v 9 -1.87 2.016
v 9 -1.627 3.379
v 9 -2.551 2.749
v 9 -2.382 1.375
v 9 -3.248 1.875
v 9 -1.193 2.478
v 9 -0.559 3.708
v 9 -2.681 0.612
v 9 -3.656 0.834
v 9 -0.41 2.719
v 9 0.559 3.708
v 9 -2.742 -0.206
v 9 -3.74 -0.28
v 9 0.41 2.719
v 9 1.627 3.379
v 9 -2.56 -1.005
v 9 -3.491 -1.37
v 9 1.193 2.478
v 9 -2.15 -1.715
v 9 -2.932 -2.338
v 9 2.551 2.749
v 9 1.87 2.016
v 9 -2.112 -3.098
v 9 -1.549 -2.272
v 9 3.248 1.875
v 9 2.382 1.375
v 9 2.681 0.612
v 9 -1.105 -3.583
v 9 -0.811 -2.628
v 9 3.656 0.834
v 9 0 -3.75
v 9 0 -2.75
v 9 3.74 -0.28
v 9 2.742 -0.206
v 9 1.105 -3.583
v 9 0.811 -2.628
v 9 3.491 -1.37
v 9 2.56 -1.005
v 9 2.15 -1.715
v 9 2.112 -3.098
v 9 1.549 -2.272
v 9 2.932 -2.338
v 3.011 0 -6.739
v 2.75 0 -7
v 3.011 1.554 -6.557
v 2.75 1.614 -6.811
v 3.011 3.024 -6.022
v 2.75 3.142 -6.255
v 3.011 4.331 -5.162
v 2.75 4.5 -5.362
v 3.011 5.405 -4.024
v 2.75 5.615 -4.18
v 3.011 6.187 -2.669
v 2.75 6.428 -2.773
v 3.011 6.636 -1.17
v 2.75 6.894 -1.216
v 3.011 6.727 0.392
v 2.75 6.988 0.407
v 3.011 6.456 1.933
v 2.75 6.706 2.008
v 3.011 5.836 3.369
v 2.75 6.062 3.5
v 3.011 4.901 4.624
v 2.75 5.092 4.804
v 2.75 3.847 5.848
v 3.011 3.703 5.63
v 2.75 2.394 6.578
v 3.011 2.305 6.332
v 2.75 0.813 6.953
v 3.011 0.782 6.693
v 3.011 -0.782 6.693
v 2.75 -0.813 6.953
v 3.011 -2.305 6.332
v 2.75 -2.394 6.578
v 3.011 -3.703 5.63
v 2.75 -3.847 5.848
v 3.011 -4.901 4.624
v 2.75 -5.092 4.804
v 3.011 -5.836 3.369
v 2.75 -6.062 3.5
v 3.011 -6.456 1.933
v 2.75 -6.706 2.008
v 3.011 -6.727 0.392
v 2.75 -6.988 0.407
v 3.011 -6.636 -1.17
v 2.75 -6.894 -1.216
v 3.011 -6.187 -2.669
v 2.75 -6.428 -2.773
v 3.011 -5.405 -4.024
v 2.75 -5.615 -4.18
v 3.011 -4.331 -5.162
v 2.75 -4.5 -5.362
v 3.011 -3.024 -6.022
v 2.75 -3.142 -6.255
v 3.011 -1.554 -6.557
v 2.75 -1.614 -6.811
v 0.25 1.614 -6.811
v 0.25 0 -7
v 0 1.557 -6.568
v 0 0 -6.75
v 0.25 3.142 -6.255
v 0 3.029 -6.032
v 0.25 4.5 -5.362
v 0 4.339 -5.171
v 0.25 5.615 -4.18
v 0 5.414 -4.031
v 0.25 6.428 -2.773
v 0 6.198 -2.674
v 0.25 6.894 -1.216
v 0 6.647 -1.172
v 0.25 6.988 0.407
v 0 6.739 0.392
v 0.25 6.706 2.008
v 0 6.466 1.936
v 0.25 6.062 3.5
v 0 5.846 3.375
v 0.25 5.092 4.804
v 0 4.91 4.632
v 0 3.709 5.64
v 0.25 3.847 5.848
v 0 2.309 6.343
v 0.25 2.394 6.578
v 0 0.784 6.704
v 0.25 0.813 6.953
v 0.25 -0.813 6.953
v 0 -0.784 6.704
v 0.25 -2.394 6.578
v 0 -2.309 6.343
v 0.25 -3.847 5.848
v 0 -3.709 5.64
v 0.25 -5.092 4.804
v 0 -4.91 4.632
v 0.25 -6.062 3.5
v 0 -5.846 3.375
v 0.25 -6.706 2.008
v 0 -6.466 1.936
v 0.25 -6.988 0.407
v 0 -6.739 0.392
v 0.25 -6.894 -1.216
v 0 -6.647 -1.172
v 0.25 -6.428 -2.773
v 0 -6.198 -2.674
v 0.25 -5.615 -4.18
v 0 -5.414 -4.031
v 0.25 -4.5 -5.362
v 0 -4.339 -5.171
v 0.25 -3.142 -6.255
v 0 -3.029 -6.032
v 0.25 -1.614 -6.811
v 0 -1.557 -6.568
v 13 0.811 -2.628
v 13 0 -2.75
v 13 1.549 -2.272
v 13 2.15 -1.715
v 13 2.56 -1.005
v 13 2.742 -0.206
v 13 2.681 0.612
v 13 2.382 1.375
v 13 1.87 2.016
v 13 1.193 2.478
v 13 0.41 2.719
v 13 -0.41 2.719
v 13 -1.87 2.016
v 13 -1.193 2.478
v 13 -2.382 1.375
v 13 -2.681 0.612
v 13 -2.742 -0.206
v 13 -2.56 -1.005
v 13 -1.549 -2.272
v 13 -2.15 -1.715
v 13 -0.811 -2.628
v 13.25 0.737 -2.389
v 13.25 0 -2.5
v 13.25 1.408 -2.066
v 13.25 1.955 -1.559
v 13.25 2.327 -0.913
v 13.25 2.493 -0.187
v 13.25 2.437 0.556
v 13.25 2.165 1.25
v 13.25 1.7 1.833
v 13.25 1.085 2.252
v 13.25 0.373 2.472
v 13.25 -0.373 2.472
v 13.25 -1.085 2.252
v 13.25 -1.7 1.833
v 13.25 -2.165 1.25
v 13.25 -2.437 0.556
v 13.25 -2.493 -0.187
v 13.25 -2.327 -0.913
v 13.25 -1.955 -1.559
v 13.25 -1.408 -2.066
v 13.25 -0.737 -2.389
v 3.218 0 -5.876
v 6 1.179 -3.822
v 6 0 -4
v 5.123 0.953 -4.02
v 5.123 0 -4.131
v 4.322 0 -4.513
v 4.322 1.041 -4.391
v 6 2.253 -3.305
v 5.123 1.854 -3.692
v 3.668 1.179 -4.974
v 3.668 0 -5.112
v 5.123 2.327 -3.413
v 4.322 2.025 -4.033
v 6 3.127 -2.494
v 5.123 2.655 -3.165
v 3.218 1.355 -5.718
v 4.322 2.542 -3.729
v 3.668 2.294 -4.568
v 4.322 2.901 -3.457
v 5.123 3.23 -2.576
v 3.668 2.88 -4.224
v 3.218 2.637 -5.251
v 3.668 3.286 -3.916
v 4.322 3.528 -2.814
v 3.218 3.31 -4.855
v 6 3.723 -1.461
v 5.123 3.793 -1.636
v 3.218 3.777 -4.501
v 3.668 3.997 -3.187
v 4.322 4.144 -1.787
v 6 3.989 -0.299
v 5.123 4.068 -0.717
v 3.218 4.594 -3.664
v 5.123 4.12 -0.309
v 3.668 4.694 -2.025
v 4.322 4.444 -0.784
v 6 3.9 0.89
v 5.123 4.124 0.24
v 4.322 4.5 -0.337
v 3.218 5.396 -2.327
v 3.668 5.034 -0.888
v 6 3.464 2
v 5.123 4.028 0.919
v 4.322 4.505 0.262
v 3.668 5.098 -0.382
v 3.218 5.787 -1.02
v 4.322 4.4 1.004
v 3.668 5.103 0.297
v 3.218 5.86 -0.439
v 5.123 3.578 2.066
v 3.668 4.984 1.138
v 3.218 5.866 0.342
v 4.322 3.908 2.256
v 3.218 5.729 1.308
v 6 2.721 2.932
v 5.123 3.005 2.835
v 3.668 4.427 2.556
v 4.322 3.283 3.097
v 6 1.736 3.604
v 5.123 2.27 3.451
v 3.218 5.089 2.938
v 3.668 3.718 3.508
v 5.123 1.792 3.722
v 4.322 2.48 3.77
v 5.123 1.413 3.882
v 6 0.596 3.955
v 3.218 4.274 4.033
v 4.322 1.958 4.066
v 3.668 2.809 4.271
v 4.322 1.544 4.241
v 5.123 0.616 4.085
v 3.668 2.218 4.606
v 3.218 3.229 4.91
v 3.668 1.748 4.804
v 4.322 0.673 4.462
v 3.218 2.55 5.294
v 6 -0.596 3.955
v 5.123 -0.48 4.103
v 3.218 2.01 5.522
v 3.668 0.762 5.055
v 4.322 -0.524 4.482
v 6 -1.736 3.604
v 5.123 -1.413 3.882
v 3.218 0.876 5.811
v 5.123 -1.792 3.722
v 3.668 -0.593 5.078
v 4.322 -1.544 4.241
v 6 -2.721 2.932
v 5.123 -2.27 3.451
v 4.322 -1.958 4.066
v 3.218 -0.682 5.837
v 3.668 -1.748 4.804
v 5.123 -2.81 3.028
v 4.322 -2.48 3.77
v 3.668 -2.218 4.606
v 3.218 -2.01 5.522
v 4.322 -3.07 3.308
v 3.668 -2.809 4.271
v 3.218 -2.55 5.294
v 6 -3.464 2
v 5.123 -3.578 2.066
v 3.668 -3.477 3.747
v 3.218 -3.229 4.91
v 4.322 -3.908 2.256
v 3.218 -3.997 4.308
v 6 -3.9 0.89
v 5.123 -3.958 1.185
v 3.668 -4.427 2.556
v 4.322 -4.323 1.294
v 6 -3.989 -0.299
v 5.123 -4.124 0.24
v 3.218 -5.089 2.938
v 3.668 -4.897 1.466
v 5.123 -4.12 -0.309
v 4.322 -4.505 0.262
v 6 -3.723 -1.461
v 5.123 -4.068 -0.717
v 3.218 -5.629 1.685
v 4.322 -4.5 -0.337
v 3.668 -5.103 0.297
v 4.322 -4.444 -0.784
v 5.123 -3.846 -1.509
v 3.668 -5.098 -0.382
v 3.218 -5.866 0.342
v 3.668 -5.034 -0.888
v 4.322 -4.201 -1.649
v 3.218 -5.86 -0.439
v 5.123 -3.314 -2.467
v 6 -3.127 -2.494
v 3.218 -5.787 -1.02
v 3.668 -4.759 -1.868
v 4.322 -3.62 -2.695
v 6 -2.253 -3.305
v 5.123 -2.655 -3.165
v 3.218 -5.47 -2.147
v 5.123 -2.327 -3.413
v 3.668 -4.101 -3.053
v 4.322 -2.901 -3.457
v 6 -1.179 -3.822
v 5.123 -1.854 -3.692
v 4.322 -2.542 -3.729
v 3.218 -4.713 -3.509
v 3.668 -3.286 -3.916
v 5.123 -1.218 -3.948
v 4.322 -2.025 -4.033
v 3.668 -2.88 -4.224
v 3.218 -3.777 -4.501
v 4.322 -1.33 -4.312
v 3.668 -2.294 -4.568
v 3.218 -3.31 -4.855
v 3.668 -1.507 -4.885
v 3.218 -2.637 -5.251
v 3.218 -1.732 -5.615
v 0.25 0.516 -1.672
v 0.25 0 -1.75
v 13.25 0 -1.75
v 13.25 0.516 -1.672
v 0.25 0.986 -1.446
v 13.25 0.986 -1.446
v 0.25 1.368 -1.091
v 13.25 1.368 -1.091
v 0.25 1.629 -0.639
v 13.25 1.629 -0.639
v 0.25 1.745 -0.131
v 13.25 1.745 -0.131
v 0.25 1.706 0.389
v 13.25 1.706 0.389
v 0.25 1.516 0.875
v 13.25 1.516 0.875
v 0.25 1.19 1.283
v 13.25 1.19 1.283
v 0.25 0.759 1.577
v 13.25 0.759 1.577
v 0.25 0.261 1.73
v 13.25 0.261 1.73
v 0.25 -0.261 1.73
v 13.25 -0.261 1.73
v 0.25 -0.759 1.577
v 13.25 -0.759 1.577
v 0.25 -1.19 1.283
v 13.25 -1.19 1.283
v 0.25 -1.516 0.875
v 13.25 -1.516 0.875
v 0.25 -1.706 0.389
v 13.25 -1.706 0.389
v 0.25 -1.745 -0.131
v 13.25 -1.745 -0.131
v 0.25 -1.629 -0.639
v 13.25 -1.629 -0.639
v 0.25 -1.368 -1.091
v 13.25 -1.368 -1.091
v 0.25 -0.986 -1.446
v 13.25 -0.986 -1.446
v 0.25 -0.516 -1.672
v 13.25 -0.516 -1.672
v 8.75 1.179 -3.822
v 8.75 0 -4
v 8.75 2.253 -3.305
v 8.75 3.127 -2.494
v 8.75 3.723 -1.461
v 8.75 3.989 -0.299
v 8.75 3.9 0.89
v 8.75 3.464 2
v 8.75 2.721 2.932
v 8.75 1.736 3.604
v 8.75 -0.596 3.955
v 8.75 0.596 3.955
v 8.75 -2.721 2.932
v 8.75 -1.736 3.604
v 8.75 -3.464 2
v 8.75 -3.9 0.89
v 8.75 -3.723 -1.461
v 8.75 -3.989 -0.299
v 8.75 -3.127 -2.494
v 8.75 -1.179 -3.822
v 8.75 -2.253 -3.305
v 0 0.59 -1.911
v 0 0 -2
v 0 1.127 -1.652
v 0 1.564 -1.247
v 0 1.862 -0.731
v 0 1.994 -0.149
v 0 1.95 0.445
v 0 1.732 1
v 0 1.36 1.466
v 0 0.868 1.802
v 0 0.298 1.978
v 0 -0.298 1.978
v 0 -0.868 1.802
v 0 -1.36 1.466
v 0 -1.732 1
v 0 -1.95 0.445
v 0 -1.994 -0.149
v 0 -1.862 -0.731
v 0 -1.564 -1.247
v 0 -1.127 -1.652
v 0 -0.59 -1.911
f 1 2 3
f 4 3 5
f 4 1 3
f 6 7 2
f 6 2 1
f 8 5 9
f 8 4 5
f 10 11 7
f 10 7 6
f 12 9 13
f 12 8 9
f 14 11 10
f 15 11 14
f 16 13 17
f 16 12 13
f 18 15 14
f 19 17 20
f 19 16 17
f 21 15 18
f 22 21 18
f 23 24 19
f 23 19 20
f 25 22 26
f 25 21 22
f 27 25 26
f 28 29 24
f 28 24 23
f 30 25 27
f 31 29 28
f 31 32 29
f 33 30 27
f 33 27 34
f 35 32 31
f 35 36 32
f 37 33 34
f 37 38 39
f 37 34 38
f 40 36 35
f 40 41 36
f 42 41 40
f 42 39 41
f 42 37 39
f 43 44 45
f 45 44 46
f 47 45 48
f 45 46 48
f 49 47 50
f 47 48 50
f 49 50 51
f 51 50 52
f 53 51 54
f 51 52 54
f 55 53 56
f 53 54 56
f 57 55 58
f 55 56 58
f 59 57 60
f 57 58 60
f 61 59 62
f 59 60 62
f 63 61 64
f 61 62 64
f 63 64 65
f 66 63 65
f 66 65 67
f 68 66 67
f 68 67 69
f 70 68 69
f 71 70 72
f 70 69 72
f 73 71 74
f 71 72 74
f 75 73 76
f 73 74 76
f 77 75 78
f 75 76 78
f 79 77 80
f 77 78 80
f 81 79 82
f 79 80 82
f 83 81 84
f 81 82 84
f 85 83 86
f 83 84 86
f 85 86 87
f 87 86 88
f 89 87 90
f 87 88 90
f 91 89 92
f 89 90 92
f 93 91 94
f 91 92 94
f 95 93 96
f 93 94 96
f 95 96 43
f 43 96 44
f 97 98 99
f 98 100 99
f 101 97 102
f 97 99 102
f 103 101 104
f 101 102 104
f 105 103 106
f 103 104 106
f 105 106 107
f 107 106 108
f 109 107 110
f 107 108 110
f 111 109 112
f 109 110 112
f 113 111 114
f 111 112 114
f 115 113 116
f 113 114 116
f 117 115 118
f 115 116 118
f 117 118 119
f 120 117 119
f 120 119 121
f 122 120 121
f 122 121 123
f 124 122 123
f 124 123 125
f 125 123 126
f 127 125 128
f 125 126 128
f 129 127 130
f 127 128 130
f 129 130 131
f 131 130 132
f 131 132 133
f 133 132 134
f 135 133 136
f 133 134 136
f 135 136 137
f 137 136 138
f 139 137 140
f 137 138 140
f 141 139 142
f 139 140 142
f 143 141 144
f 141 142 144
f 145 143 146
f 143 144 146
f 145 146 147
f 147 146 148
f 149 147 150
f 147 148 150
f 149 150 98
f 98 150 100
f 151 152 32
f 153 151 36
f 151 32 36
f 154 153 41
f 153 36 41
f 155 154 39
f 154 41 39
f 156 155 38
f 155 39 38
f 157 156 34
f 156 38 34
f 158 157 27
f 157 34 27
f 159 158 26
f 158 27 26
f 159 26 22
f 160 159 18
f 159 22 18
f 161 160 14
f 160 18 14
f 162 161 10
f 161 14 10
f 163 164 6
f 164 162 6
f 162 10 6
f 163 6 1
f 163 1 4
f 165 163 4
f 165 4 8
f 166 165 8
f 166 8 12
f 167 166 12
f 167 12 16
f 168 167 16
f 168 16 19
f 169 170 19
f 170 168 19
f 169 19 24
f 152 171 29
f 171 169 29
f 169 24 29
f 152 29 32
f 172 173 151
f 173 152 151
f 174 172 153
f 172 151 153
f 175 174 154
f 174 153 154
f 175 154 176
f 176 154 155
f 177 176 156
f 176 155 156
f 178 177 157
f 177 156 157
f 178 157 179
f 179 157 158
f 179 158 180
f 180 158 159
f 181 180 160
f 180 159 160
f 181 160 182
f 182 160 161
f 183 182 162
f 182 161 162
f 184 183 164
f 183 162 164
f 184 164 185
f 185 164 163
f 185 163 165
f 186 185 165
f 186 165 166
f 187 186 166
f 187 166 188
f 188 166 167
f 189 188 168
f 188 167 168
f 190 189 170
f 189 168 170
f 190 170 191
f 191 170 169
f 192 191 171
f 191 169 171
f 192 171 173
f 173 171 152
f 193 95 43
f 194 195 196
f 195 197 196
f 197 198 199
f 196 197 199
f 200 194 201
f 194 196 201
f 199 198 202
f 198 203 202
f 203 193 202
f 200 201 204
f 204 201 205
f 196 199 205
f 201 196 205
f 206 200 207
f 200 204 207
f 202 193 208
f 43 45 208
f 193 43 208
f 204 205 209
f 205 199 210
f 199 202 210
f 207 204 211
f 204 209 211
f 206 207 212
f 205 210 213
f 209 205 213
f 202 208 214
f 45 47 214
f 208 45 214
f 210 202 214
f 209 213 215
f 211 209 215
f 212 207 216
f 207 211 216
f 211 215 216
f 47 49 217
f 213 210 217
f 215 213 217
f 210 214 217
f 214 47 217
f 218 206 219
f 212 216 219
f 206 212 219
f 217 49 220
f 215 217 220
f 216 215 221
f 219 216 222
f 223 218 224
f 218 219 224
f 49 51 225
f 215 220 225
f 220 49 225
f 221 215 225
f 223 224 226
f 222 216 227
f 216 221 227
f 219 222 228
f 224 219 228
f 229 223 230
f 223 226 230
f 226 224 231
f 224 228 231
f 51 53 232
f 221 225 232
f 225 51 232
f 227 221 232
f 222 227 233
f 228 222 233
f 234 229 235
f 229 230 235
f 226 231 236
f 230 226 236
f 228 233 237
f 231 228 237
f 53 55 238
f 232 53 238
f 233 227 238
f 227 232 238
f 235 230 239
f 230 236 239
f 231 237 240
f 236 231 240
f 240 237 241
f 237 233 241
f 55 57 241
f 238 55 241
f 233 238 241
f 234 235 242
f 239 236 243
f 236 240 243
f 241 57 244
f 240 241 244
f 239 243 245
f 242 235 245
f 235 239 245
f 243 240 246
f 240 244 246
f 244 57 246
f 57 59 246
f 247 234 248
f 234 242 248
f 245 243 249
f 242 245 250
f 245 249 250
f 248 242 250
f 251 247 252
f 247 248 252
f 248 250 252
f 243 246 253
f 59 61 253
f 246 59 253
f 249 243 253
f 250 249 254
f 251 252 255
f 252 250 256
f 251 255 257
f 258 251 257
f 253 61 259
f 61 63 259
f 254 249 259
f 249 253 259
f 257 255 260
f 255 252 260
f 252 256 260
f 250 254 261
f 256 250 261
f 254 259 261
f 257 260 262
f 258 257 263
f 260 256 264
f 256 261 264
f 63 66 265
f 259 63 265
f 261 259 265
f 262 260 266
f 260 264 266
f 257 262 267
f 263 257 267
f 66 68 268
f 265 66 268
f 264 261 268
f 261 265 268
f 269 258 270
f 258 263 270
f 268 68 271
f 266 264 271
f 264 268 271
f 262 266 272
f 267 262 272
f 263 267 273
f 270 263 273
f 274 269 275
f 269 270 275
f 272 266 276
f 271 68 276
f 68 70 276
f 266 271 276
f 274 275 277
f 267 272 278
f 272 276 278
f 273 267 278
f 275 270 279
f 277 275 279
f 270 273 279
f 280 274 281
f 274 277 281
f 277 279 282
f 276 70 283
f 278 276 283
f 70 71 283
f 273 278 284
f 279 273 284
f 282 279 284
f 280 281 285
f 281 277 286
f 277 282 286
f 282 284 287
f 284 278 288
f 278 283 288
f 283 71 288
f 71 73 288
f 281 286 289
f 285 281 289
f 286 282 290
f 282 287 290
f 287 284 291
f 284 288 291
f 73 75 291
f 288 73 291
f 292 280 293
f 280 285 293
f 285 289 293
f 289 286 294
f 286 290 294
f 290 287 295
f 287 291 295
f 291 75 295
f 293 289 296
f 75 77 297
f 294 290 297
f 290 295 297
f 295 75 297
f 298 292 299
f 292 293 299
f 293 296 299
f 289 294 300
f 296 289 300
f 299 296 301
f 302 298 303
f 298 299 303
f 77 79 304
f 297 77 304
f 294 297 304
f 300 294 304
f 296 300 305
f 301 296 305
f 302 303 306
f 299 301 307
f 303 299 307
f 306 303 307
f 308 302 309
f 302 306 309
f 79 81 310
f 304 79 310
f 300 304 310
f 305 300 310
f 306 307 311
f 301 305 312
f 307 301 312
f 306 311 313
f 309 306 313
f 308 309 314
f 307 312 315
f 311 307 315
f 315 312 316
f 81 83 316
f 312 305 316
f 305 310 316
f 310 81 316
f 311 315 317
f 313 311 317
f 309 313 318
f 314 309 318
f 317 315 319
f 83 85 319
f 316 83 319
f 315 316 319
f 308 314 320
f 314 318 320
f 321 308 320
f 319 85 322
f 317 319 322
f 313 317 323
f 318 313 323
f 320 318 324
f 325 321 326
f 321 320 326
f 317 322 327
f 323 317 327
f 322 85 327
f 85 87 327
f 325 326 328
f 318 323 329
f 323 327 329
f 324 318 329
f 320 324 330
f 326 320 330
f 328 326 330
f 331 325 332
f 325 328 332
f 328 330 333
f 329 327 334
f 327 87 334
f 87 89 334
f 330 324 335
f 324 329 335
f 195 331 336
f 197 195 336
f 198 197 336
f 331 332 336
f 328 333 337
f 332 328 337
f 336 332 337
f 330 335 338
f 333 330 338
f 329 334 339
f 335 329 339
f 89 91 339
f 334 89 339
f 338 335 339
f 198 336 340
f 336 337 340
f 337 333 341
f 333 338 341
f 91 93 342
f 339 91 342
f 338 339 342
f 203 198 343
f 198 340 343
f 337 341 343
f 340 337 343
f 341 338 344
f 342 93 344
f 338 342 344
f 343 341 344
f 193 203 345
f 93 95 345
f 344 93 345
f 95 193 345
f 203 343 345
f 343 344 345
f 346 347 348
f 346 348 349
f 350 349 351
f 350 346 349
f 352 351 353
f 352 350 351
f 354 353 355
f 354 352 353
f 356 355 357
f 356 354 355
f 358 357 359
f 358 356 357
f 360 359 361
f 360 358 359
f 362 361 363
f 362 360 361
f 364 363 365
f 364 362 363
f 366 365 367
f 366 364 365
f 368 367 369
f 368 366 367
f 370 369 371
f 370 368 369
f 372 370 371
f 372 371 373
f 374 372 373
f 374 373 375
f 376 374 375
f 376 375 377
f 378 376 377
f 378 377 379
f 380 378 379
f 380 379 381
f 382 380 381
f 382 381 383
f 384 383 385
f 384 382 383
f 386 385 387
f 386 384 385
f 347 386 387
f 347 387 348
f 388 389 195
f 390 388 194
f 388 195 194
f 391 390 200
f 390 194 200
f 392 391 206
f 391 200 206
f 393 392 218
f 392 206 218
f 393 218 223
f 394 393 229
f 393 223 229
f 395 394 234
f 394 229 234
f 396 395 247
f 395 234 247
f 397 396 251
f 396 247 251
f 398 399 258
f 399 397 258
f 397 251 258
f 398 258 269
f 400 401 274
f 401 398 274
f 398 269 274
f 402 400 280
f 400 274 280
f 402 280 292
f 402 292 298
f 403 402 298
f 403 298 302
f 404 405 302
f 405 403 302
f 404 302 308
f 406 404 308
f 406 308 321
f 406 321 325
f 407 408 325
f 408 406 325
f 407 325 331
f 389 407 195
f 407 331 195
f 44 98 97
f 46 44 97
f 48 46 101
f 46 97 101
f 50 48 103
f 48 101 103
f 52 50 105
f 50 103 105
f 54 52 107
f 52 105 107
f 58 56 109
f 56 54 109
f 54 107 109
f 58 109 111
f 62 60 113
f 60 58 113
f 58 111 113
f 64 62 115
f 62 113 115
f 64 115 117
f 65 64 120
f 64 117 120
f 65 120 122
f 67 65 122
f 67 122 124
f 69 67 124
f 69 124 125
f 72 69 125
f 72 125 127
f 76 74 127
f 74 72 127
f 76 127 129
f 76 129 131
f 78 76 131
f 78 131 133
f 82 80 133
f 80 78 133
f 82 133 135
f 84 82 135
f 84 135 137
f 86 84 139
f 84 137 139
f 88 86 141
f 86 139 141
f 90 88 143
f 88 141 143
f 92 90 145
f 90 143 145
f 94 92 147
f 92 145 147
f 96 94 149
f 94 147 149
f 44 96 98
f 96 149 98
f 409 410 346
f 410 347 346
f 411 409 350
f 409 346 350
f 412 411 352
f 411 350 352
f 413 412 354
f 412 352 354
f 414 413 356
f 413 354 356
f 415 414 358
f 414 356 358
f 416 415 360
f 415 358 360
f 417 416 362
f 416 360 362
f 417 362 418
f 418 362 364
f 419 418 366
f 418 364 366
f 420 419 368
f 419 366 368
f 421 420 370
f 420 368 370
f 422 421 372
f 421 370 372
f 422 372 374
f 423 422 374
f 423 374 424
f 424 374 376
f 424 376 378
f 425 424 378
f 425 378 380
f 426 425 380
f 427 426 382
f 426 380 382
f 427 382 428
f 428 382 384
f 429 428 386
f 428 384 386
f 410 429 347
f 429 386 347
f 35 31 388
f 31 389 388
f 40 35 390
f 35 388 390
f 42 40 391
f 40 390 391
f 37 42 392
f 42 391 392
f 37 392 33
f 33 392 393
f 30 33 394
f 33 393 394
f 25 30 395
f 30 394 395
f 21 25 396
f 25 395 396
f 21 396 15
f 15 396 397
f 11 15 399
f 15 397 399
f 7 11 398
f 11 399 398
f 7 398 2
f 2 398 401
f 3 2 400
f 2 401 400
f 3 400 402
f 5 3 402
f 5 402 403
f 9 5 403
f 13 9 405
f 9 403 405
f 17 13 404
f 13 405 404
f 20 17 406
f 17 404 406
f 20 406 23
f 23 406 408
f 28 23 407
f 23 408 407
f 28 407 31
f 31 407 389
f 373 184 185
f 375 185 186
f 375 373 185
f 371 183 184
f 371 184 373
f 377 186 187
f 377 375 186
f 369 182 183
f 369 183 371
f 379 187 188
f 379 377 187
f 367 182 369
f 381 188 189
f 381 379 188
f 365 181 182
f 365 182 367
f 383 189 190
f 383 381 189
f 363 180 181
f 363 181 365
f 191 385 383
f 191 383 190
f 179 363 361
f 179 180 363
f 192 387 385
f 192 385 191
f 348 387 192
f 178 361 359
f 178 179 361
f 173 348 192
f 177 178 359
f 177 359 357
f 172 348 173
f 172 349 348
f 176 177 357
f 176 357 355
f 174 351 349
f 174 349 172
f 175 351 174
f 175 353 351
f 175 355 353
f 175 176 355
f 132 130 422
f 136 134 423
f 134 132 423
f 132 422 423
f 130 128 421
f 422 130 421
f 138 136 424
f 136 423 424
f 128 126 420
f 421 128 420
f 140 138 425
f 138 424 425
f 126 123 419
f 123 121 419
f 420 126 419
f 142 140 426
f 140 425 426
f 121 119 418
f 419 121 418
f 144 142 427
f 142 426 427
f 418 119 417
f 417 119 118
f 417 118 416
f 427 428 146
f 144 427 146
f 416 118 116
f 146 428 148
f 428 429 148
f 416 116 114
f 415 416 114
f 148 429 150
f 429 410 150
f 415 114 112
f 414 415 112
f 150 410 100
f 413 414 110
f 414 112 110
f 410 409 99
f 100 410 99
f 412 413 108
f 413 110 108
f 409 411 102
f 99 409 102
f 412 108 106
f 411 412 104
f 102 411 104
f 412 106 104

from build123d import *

# Parameters (mm, degrees)
SKETCH1_R           = 7
SKETCH1_R_2         = 1.75
BOSS_EXTRUDE1_DEPTH = 3
SKETCH2_R           = 4
SKETCH2_R_2         = 1.75
BOSS_EXTRUDE2_DEPTH = 6
FILLET1_R           = 3
SKETCH4_R           = 2.75
SKETCH4_R_2         = 1.75
BOSS_EXTRUDE3_DEPTH = 4.25


# Some blends are built 0.0001 mm under size
with BuildPart() as part:
    # Sketch1 → Boss-Extrude1 (new body)
    with BuildSketch(Plane(origin=(0, 0, 0), x_dir=(0, 0, -1), z_dir=(1, 0, 0))):
        Circle(SKETCH1_R)
        Circle(SKETCH1_R_2, mode=Mode.SUBTRACT)
    extrude(amount=BOSS_EXTRUDE1_DEPTH)

    # Sketch2 → Boss-Extrude2 (add)
    with BuildSketch(Plane(origin=(3, 0, 0), x_dir=(0, 0, -1), z_dir=(1, 0, 0))):
        Circle(SKETCH2_R)
        Circle(SKETCH2_R_2, mode=Mode.SUBTRACT)
    extrude(amount=BOSS_EXTRUDE2_DEPTH)

    # Fillet1
    fillet1_edges = [part.edges().sort_by_distance(p)[0] for p in [
        (3, 0, 4),
    ]]
    fillet(fillet1_edges, radius=FILLET1_R - 0.0001)  # a hair under: the kernel refuses the full size

    # Sketch4 → Boss-Extrude3 (add)
    with BuildSketch(Plane(origin=(9, 0, 0), x_dir=(0, 0, -1), z_dir=(1, 0, 0))):
        Circle(SKETCH4_R)
        Circle(SKETCH4_R_2, mode=Mode.SUBTRACT)
    extrude(amount=BOSS_EXTRUDE3_DEPTH)

    # Chamfer1
    # the kernel refuses this chamfer: 0.25 mm, written as the material it takes off along each edge
    with BuildSketch(Plane(origin=(9, 0, 0), x_dir=(0, 0, -1), z_dir=(0, -1, 0))) as chamfer1_piece_1:
        with BuildLine():
            Line((3.696966991, 0.053033009), (4.053033009, -0.303033009))
            Line((4.053033009, -0.303033009), (4.090533009, -0.303033009))
            ThreePointArc((4.090533009, -0.303033009), (4.0375, -0.151516504), (4.0375, 0))
            Line((4.0375, 0), (4, 0.0375))
            ThreePointArc((4, 0.0375), (3.848483496, 0.0375), (3.696966991, 0.090533009))
            Line((3.696966991, 0.090533009), (3.696966991, 0.053033009))
        make_face()
    revolve(axis=Axis((9, 0, 0), (1, 0, 0)), mode=Mode.SUBTRACT)
    with BuildSketch(Plane(origin=(0, 0, 0), x_dir=(0, 0, -1), z_dir=(0, -1, 0))) as chamfer1_piece_2:
        with BuildLine():
            Line((7.053033009, 0.303033009), (6.696966991, -0.053033009))
            Line((6.696966991, -0.053033009), (6.696966991, -0.090533009))
            ThreePointArc((6.696966991, -0.090533009), (6.848483496, -0.0375), (7, -0.0375))
            Line((7, -0.0375), (7.0375, 0))
            ThreePointArc((7.0375, 0), (7.0375, 0.151516504), (7.090533009, 0.303033009))
            Line((7.090533009, 0.303033009), (7.053033009, 0.303033009))
        make_face()
    revolve(axis=Axis((0, 0, 0), (1, 0, 0)), mode=Mode.SUBTRACT)
    with BuildSketch(Plane(origin=(13.25, 0, 0), x_dir=(0, 0, -1), z_dir=(0, -1, 0))) as chamfer1_piece_3:
        with BuildLine():
            Line((2.446966991, 0.053033009), (2.803033009, -0.303033009))
            Line((2.803033009, -0.303033009), (2.840533009, -0.303033009))
            ThreePointArc((2.840533009, -0.303033009), (2.7875, -0.151516504), (2.7875, 0))
            Line((2.7875, 0), (2.75, 0.0375))
            ThreePointArc((2.75, 0.0375), (2.598483496, 0.0375), (2.446966991, 0.090533009))
            Line((2.446966991, 0.090533009), (2.446966991, 0.053033009))
        make_face()
    revolve(axis=Axis((13.25, 0, 0), (1, 0, 0)), mode=Mode.SUBTRACT)
    with BuildSketch(Plane(origin=(3, 0, 0), x_dir=(0, 0, -1), z_dir=(0, -1, 0))) as chamfer1_piece_4:
        with BuildLine():
            Line((6.696966991, 0.053033009), (7.053033009, -0.303033009))
            Line((7.053033009, -0.303033009), (7.090533009, -0.303033009))
            ThreePointArc((7.090533009, -0.303033009), (7.0375, -0.151516504), (7.0375, 0))
            Line((7.0375, 0), (7, 0.0375))
            ThreePointArc((7, 0.0375), (6.848483496, 0.0375), (6.696966991, 0.090533009))
            Line((6.696966991, 0.090533009), (6.696966991, 0.053033009))
        make_face()
    revolve(axis=Axis((3, 0, 0), (1, 0, 0)), mode=Mode.SUBTRACT)
    with BuildSketch(Plane(origin=(0, 0, 0), x_dir=(0, 0, -1), z_dir=(0, -1, 0))) as chamfer1_piece_5:
        with BuildLine():
            Line((2.053033009, -0.053033009), (1.696966991, 0.303033009))
            Line((1.696966991, 0.303033009), (1.659466991, 0.303033009))
            ThreePointArc((1.659466991, 0.303033009), (1.7125, 0.151516504), (1.7125, 0))
            Line((1.7125, 0), (1.75, -0.0375))
            ThreePointArc((1.75, -0.0375), (1.901516504, -0.0375), (2.053033009, -0.090533009))
            Line((2.053033009, -0.090533009), (2.053033009, -0.053033009))
        make_face()
    revolve(axis=Axis((0, 0, 0), (1, 0, 0)), mode=Mode.SUBTRACT)


solid = part.part
